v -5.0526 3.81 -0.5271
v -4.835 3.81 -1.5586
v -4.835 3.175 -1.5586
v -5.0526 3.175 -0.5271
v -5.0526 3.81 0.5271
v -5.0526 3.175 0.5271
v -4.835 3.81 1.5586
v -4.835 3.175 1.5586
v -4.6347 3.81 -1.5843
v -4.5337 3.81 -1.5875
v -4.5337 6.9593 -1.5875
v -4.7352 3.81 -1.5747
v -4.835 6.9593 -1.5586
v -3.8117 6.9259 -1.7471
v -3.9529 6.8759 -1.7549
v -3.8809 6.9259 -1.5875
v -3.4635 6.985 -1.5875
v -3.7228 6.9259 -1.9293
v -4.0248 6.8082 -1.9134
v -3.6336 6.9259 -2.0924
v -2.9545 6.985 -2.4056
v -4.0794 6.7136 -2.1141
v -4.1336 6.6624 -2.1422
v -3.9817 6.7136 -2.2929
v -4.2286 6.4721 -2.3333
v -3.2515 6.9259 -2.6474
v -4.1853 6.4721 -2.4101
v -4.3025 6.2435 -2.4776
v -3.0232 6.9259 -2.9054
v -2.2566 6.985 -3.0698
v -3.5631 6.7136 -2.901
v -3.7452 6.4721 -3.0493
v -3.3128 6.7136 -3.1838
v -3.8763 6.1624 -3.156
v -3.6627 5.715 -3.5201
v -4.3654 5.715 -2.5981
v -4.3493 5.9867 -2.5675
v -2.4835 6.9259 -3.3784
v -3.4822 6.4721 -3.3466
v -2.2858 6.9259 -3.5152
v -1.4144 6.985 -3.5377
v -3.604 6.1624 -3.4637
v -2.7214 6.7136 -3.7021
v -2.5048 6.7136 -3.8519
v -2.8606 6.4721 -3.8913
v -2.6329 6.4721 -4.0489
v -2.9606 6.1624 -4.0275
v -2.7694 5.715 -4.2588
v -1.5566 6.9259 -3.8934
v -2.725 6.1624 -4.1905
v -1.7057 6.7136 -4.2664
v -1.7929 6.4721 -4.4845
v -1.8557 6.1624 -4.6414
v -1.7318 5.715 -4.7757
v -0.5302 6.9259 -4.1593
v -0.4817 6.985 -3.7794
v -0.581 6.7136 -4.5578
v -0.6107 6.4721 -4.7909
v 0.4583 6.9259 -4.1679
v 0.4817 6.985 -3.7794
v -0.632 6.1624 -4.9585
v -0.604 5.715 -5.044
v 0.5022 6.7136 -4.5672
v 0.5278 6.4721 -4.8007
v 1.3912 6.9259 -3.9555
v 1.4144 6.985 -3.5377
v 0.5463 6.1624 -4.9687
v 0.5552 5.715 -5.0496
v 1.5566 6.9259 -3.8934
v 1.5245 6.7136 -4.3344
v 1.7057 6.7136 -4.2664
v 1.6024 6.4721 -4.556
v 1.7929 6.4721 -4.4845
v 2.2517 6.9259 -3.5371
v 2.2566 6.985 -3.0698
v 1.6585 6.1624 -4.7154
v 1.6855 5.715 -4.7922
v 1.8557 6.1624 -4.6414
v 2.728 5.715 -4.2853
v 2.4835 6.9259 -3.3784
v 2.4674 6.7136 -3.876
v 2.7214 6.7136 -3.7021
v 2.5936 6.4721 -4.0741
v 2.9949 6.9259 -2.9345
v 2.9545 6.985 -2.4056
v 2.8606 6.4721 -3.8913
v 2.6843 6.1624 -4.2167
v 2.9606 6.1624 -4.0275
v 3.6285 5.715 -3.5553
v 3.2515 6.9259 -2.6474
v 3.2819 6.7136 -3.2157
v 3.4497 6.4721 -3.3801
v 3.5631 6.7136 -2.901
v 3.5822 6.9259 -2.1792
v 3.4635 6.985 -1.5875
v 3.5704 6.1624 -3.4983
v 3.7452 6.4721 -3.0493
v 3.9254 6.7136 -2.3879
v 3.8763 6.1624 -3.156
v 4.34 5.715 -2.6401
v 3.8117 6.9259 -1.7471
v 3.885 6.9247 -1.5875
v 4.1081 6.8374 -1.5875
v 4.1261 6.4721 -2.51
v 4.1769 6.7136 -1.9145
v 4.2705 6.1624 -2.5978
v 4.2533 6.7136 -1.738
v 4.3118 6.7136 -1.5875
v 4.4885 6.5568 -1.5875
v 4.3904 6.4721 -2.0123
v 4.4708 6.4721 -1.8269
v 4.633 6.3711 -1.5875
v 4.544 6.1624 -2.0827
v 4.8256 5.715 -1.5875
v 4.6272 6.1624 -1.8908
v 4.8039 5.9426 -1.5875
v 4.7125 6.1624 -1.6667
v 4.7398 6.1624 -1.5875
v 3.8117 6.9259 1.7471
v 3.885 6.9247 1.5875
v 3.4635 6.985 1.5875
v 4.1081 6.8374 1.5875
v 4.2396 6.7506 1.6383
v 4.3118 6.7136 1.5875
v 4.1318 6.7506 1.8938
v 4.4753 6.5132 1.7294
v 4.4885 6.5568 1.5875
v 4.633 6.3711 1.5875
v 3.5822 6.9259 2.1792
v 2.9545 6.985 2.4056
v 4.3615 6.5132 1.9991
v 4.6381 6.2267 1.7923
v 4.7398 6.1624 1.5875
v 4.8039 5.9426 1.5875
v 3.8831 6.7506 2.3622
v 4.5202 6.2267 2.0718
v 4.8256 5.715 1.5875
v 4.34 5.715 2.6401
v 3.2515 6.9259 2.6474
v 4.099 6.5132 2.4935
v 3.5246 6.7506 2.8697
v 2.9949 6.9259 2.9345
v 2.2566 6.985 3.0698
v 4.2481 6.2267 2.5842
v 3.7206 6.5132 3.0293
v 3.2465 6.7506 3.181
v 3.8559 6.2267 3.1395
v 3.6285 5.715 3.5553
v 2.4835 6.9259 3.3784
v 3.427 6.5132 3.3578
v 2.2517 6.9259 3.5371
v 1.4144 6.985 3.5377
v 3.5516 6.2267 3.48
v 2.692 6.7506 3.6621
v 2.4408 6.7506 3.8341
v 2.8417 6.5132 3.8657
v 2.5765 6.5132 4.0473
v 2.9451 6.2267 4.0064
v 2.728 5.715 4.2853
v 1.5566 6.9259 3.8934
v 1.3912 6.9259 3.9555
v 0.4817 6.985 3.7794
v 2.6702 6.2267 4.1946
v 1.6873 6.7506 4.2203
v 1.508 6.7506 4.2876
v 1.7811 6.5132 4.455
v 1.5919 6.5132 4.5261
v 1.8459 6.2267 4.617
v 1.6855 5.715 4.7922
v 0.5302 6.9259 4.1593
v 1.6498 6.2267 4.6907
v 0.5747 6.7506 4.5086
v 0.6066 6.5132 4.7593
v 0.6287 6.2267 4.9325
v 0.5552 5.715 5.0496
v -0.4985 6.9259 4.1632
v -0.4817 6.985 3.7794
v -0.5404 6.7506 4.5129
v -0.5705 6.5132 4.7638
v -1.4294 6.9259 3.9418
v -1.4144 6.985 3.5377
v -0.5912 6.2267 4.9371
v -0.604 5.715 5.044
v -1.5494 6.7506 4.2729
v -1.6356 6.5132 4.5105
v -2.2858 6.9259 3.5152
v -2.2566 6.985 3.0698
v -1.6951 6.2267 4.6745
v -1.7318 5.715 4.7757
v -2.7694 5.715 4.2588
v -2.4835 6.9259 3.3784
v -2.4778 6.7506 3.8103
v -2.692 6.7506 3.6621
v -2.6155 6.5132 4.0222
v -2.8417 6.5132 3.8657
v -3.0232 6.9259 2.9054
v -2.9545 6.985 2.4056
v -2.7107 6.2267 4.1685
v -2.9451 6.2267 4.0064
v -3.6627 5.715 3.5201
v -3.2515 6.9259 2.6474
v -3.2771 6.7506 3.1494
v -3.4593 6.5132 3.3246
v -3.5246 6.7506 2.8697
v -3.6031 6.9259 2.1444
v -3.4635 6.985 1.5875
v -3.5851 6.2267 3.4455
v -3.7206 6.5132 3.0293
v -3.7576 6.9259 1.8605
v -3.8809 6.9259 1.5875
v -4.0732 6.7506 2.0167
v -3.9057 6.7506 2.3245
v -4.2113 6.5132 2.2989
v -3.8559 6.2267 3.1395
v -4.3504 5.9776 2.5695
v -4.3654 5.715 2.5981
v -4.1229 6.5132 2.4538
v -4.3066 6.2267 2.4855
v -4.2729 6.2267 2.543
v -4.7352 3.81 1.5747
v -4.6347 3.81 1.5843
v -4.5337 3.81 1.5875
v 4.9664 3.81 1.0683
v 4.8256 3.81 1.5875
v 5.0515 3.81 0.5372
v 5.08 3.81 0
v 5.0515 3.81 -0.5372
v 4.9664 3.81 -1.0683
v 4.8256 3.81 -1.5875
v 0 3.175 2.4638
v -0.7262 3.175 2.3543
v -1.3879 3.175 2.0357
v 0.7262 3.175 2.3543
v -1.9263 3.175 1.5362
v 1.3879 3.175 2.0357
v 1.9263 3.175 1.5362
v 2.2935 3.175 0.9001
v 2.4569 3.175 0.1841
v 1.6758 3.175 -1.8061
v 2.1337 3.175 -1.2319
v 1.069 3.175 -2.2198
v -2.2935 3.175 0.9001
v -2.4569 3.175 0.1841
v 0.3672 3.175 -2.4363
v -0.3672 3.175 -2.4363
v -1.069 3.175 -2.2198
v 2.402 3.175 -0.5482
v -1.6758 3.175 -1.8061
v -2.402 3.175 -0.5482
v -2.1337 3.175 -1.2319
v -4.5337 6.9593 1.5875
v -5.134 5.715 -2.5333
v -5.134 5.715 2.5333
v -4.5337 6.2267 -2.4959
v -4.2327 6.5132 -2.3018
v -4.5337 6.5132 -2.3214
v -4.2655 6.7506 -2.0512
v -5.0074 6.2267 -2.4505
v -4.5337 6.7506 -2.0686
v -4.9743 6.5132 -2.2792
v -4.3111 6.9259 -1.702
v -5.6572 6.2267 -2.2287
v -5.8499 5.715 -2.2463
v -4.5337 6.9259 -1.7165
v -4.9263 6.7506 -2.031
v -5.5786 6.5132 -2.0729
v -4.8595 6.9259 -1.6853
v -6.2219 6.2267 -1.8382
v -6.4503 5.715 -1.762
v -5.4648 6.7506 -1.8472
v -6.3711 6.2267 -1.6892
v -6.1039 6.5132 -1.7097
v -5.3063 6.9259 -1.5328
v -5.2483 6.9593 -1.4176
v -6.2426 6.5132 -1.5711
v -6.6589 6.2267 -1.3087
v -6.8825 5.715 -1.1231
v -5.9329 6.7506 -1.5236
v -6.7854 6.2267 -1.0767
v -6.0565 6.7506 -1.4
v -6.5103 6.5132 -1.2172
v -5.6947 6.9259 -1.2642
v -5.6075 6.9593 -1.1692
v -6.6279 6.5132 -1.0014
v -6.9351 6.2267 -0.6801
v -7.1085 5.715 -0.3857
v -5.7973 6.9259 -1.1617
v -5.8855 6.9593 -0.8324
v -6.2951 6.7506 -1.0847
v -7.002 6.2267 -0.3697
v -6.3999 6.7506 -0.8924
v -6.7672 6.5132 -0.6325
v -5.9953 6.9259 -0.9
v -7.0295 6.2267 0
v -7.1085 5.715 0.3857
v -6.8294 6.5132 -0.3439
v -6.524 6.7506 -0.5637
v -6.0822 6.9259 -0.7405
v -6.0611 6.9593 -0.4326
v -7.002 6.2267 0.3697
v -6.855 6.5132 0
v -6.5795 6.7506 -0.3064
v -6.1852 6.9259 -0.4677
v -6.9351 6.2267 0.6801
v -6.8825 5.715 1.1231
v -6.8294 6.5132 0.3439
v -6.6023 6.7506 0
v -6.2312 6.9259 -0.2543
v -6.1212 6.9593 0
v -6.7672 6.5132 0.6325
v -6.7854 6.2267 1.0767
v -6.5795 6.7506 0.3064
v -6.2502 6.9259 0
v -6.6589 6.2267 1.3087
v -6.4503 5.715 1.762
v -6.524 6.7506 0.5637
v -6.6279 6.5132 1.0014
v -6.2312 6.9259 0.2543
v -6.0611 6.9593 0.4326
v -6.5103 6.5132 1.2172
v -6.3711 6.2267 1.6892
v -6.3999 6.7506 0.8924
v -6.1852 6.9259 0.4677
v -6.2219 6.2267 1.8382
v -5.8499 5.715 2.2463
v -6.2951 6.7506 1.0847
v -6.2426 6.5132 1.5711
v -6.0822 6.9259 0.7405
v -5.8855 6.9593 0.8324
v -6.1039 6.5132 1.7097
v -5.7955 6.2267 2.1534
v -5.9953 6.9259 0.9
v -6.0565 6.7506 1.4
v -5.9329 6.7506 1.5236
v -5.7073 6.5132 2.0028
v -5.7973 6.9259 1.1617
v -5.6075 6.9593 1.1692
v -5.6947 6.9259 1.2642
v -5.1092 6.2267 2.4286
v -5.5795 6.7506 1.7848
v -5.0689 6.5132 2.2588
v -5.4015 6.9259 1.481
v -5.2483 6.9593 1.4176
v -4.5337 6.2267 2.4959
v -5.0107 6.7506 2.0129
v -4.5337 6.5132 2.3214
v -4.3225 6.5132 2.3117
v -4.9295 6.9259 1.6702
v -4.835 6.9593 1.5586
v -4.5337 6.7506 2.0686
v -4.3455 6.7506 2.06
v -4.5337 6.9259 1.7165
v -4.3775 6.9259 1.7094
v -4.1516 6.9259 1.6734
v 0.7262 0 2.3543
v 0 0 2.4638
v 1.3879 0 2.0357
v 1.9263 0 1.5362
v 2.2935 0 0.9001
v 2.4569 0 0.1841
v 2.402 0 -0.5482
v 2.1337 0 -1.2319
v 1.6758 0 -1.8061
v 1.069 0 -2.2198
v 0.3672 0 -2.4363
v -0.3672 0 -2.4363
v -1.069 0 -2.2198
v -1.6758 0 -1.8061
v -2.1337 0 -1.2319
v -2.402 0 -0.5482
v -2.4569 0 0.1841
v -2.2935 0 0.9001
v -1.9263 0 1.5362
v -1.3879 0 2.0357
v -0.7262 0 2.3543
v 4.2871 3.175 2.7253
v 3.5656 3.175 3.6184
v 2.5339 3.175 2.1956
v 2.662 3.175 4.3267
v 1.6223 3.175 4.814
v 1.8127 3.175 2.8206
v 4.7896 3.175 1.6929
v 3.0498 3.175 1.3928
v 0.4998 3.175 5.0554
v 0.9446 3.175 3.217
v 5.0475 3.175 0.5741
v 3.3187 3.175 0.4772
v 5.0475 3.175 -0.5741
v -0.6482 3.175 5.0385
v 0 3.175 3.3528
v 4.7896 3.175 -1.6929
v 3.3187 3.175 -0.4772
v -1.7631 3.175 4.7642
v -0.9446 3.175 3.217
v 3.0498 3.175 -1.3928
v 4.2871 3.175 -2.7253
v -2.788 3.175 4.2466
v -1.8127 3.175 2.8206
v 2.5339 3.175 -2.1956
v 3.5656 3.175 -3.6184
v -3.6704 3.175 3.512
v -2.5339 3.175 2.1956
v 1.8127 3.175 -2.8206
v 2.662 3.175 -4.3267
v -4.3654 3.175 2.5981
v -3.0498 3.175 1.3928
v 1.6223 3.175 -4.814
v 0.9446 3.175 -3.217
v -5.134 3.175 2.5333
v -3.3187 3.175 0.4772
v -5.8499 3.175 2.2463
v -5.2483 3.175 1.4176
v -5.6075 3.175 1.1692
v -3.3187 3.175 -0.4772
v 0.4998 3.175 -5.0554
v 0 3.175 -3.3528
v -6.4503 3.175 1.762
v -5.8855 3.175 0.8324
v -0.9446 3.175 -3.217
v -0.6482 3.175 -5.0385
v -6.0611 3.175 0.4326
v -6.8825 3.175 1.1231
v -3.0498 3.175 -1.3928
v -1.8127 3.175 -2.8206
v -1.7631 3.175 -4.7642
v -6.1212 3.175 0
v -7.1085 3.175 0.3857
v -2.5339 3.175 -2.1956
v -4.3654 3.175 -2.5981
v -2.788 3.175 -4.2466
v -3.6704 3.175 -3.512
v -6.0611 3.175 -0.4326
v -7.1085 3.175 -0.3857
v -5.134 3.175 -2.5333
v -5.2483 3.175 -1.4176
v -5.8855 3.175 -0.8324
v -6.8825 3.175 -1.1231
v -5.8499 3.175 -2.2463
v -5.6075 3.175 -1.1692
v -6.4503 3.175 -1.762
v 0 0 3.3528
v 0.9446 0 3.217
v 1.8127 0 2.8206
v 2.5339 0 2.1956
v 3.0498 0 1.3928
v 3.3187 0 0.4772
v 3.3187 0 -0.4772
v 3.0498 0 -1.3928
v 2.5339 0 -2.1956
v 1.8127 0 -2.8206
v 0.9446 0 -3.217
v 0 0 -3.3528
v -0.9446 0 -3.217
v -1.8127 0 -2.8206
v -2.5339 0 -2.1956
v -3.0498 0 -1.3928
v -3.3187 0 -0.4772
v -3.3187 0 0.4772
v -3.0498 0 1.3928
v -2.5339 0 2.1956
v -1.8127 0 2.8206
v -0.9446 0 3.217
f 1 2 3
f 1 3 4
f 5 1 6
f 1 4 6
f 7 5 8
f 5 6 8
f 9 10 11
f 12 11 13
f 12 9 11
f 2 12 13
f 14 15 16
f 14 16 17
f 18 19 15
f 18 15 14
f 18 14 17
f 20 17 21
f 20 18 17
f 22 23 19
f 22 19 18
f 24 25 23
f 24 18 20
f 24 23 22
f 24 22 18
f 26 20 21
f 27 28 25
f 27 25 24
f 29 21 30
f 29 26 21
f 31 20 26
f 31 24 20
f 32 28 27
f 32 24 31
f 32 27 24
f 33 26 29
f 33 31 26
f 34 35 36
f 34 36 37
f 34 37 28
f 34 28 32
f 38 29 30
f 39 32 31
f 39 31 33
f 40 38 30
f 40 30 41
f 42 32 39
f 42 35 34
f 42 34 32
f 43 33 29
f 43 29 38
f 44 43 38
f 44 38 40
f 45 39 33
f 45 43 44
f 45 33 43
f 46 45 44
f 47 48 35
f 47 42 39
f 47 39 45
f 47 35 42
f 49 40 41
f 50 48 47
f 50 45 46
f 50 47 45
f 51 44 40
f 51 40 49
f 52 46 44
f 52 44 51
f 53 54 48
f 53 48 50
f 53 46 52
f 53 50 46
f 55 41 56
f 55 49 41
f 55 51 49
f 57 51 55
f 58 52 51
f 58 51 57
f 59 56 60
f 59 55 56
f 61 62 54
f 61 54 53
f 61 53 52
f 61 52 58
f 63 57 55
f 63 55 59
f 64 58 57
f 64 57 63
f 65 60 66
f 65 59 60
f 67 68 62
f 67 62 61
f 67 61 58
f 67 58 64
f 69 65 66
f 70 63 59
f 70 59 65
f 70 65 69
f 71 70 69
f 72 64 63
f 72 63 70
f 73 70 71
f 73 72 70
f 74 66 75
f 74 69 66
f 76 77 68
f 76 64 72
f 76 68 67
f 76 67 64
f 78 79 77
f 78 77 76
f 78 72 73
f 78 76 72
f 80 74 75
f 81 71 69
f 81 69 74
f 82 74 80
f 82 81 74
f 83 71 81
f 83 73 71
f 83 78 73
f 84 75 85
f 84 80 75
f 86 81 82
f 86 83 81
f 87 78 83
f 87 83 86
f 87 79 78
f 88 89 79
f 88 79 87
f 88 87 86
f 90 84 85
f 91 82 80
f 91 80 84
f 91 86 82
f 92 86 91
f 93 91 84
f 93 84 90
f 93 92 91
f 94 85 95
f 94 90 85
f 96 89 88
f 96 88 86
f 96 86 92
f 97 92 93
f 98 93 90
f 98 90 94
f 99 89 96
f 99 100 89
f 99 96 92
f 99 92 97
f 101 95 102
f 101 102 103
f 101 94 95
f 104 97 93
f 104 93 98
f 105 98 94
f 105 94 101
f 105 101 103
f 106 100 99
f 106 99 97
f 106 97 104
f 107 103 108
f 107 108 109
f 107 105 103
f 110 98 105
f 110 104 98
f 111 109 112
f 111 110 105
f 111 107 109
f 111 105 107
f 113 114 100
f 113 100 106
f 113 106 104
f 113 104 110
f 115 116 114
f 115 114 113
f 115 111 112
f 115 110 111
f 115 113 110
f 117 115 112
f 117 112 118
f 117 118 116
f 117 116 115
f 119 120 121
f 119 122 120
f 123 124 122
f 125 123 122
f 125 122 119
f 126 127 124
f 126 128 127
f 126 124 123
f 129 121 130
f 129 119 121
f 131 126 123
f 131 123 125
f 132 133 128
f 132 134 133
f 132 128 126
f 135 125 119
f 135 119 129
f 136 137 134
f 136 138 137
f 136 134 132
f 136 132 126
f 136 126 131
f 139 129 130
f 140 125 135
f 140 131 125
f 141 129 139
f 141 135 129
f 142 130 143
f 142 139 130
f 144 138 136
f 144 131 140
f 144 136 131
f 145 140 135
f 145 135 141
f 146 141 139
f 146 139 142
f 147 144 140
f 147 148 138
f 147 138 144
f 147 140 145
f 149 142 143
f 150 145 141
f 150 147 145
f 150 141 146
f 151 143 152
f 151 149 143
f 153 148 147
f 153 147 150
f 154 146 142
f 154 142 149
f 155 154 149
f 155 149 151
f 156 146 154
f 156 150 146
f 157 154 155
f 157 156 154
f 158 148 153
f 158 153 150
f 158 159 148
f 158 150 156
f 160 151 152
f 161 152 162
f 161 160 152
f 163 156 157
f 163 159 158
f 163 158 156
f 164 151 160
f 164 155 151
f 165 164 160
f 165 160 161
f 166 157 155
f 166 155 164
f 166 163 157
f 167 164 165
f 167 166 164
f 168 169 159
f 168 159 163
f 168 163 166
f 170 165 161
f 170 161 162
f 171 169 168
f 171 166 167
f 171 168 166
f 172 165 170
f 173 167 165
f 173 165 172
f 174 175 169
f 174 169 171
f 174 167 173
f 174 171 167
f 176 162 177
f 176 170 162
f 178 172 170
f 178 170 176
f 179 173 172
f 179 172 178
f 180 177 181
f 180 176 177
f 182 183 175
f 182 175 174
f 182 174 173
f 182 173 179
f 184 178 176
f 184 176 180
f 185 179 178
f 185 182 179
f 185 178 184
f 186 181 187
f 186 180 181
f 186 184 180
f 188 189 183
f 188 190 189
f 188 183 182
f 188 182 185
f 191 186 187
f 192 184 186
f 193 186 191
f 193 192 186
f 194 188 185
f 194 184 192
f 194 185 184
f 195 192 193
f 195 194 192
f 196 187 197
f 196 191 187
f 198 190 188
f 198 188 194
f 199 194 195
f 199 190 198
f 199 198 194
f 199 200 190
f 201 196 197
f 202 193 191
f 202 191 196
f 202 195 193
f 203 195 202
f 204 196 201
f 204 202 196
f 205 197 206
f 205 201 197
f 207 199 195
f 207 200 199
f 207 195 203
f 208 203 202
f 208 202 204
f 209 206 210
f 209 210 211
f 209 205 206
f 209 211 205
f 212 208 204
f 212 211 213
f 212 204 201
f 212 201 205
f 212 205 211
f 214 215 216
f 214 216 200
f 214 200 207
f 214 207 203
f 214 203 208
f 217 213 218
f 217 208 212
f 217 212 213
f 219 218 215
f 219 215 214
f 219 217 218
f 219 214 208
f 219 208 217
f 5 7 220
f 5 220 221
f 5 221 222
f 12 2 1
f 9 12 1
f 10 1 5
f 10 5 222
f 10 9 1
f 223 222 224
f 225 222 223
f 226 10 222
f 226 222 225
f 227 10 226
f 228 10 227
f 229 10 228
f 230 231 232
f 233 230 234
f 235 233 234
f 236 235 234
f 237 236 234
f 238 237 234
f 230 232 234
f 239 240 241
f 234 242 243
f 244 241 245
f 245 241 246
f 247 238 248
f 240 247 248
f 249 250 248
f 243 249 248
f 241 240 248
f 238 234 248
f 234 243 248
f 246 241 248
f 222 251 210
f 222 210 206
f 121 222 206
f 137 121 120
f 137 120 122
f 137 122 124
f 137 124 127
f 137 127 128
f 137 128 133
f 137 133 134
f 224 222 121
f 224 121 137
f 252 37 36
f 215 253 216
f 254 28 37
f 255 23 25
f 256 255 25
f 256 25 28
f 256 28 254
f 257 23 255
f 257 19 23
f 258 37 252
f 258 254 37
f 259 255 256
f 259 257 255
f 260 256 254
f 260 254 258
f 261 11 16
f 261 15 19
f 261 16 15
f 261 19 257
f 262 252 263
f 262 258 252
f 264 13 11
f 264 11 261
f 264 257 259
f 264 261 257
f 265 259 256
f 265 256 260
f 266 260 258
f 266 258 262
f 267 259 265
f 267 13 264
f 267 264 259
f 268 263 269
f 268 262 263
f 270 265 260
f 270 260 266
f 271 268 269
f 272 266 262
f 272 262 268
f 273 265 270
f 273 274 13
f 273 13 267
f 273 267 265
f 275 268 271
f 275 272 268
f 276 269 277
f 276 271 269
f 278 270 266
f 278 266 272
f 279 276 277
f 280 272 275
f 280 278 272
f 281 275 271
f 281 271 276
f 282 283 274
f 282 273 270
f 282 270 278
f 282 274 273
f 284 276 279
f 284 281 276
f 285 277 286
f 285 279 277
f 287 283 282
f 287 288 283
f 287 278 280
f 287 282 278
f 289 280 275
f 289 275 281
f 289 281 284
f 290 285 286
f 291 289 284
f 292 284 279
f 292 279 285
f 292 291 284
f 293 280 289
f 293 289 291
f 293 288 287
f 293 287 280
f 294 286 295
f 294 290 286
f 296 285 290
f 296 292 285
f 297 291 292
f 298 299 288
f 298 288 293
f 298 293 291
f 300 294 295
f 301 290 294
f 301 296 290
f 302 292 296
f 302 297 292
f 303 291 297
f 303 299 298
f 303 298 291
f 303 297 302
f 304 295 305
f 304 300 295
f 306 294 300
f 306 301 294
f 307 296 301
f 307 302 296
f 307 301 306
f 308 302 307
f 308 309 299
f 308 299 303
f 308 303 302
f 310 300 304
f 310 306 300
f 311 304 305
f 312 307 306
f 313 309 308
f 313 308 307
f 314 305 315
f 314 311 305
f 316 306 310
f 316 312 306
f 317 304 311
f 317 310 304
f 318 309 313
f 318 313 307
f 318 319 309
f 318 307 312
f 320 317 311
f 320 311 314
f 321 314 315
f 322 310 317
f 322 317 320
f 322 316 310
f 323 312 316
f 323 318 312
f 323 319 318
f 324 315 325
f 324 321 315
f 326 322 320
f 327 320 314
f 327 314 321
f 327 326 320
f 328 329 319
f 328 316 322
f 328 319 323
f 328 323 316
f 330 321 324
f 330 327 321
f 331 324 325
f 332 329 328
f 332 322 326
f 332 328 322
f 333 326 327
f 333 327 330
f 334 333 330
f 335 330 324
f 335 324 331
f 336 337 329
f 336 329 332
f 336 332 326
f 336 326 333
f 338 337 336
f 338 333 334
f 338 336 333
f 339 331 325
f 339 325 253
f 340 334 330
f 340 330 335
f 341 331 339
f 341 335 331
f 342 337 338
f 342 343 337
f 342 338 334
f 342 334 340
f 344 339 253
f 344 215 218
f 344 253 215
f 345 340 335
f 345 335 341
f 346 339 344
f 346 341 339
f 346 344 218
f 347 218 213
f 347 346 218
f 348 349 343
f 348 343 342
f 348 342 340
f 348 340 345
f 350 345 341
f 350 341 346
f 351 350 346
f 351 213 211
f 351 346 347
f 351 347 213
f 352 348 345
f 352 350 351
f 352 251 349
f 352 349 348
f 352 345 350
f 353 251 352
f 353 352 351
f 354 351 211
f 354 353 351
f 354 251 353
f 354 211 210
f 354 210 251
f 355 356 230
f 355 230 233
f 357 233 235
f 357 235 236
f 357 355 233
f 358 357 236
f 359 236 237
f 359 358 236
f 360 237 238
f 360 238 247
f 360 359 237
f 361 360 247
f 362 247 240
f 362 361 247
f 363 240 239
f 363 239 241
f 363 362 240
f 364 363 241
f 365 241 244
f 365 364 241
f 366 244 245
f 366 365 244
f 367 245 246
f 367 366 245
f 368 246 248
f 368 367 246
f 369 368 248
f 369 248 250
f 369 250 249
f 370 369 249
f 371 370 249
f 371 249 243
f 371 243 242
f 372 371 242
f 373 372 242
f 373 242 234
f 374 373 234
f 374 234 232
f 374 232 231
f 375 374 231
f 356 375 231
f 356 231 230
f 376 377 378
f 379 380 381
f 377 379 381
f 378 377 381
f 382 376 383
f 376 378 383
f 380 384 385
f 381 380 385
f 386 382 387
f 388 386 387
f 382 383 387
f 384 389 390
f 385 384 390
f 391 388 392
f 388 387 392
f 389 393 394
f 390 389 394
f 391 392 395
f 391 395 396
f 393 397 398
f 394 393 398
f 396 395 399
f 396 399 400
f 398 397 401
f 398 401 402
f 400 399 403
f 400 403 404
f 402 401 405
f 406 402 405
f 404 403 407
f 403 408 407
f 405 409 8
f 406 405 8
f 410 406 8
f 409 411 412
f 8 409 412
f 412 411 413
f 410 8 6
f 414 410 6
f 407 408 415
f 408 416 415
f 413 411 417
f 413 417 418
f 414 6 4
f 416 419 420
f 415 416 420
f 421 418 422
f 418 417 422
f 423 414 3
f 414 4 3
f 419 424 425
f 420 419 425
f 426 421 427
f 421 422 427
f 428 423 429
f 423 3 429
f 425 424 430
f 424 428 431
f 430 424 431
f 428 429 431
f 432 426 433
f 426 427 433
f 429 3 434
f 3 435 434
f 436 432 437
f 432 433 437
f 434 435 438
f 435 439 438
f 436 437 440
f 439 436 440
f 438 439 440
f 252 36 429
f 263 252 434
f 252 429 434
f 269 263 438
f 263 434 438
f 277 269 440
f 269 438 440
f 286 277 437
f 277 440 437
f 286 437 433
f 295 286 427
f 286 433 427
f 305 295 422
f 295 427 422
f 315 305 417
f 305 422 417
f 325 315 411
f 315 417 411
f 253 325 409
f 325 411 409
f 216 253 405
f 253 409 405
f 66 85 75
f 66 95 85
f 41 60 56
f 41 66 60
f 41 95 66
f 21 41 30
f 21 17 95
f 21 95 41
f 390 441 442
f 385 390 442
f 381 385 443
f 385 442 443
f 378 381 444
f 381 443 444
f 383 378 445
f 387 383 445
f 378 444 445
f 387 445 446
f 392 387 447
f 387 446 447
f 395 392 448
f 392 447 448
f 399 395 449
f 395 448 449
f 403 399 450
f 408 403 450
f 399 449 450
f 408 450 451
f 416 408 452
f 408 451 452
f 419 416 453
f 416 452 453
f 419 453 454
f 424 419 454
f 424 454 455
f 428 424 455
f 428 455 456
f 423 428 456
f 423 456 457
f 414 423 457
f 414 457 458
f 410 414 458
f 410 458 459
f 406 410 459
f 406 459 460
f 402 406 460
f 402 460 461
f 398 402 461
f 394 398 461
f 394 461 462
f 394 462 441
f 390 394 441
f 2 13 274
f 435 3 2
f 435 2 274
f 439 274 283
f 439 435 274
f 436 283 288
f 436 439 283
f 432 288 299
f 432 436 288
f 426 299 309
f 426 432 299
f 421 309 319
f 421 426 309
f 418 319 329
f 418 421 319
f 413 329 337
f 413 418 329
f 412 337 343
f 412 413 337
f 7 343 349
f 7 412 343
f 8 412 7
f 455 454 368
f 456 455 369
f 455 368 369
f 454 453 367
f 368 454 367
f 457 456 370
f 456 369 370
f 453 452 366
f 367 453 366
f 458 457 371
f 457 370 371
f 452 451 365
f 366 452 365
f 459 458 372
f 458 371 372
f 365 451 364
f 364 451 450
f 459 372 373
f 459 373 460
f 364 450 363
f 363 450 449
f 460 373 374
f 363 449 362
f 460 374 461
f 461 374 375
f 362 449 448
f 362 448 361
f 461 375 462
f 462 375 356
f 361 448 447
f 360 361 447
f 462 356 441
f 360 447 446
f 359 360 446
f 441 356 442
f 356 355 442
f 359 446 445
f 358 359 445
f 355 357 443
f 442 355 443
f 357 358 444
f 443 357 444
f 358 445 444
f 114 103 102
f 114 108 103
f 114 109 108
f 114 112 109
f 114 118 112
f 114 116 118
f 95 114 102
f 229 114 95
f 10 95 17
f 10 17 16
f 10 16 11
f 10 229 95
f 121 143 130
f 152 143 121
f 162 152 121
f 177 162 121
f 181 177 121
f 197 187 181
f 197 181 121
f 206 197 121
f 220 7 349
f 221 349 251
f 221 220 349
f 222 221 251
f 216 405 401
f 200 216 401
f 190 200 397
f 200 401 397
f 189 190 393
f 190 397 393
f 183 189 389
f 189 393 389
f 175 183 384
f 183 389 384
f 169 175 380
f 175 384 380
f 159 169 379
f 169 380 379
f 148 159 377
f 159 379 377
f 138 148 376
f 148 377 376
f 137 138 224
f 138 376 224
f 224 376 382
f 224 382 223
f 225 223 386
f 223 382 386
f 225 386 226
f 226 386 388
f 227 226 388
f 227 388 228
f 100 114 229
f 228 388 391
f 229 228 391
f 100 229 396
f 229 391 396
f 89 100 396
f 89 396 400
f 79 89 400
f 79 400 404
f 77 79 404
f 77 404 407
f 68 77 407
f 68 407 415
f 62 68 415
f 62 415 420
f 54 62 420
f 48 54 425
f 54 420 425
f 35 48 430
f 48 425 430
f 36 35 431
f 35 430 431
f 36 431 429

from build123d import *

# Parameters (mm, degrees)
SKETCH1_R           = 3.3528
SKETCH1_R_2         = 2.4638
BOSS_EXTRUDE1_DEPTH = 3.175
SKETCH2_R           = 5.08
BOSS_EXTRUDE2_DEPTH = 3.81
BOSS_EXTRUDE3_START = -3.81
SKETCH3_R           = 5.08
SKETCH3_R_2         = 2.6035
SKETCH3_R_3         = 1.5875
BOSS_EXTRUDE3_DEPTH = 3.81
CUT_EXTRUDE1_START  = -3.175
CUT_EXTRUDE1_DEPTH  = 3.175
FILLET1_R           = 1.27


with BuildPart() as part:
    # Sketch1 → Boss-Extrude1 (new body)
    with BuildSketch(Plane(origin=(0, 0, 0), x_dir=(1, 0, 0), z_dir=(0, 1, 0))):
        with Locations(Location((0, 0, 0), (0, 0, 270))):
            Circle(SKETCH1_R)
        with Locations(Location((0, 0, 0), (0, 0, 270))):
            Circle(SKETCH1_R_2, mode=Mode.SUBTRACT)
    extrude(amount=BOSS_EXTRUDE1_DEPTH)

    # Sketch2 → Boss-Extrude2 (add)
    with BuildSketch(Plane(origin=(0, 3.175, 0), x_dir=(1, 0, 0), z_dir=(0, 1, 0))):
        with Locations(Location((0, 0, 0), (0, 0, 90))):
            Circle(SKETCH2_R)
    extrude(amount=BOSS_EXTRUDE2_DEPTH)

    # Sketch3 → Boss-Extrude3 (add)
    # profile 1 of 3: a face of its own
    with BuildSketch(Plane(origin=(0, 6.985, 0), x_dir=(1, 0, 0), z_dir=(0, 1, 0)).offset(BOSS_EXTRUDE3_START)):
        Circle(SKETCH3_R)
    # profile 2 of 3: a face of its own
    with BuildSketch(Plane(origin=(0, 6.985, 0), x_dir=(1, 0, 0), z_dir=(0, 1, 0)).offset(BOSS_EXTRUDE3_START)):
        with Locations((-4.533681302, 0)):
            Circle(SKETCH3_R_2)
        with Locations((-4.533681302, 0)):
            Circle(SKETCH3_R_3, mode=Mode.SUBTRACT)
    # profile 3 of 3: a face of its own
    with BuildSketch(Plane(origin=(0, 6.985, 0), x_dir=(1, 0, 0), z_dir=(0, 1, 0)).offset(BOSS_EXTRUDE3_START)):
        Circle(SKETCH3_R)
    extrude(amount=BOSS_EXTRUDE3_DEPTH)

    # Sketch4 → Cut-Extrude1 (cut)
    with BuildSketch(Plane(origin=(0, 6.985, 0), x_dir=(1, 0, 0), z_dir=(0, 1, 0)).offset(CUT_EXTRUDE1_START)):
        with BuildLine():
            ThreePointArc((-4.834979234, -1.558645504), (-4.685019521, -1.580269912), (-4.533681302, -1.5875))
            Line((-4.533681302, -1.5875), (4.825582219, -1.5875))
            ThreePointArc((4.825582219, -1.5875), (5.015992308, -0.803878824), (5.08, 0))
            ThreePointArc((5.08, 0), (5.015992308, 0.803878824), (4.825582219, 1.5875))
            Line((4.825582219, 1.5875), (-4.533681302, 1.5875))
            ThreePointArc((-4.533681302, 1.5875), (-4.685019521, 1.580269912), (-4.834979234, 1.558645504))
            ThreePointArc((-4.834979234, 1.558645504), (-5.08, 0), (-4.834979234, -1.558645504))
        make_face()
    extrude(amount=CUT_EXTRUDE1_DEPTH, mode=Mode.SUBTRACT)

    # Fillet1
    # the kernel refuses this fillet: 1.27 mm, written as the material it takes off along each edge
    with BuildSketch(Plane(origin=(-4.533681302, 6.985, 0), x_dir=(0.9598113025197432, 0, -0.2806461536443247), z_dir=(0.2806461536443247, 0, 0.9598113025197432))) as fillet1_piece_1_section:
        with BuildLine():
            CenterArc((2.6035 - FILLET1_R, -FILLET1_R), FILLET1_R, 0, 90)
            Line((2.6035, -FILLET1_R), (2.6035, 0))
            Line((2.6035, 0), (2.6035 - FILLET1_R, 0))
        make_face()
    fillet1_piece_1 = revolve(axis=Axis((-4.533681302, 6.985, 0), (0, 1, 0)), revolution_arc=327.402454095, mode=Mode.PRIVATE)
    fillet1_piece_1 = split(fillet1_piece_1, bisect_by=Plane(origin=(-4.533681302, 6.985, 1.5875), z_dir=(0, 0, -1)), keep=Keep.TOP, mode=Mode.PRIVATE)
    fillet1_piece_1 = split(fillet1_piece_1, bisect_by=Plane(origin=(-4.533681302, 6.985, -1.5875), z_dir=(0, 0, 1)), keep=Keep.TOP, mode=Mode.PRIVATE)
    add(fillet1_piece_1, mode=Mode.SUBTRACT)
    with BuildSketch(Plane(origin=(-4.533681302, 6.985, 0), x_dir=(0.9598113025197432, 0, -0.2806461536443247), z_dir=(0.2806461536443247, 0, 0.9598113025197432))) as fillet1_piece_2_section:
        with BuildLine():
            CenterArc((2.6035 - FILLET1_R, -FILLET1_R), FILLET1_R, 0, 90)
            Line((2.6035, -FILLET1_R), (2.6035, 0))
            Line((2.6035, 0), (2.6035 - FILLET1_R, 0))
        make_face()
    fillet1_piece_2 = revolve(axis=Axis((-4.533681302, 6.985, 0), (0, 1, 0)), revolution_arc=327.402454095, mode=Mode.PRIVATE)
    fillet1_piece_2 = fillet1_piece_2 - Plane(origin=(0, 6.985, 0), x_dir=(0, 0, -1), z_dir=(0, -1, 0)) * Cylinder(5.08, 11, mode=Mode.PRIVATE)
    add(fillet1_piece_2, mode=Mode.SUBTRACT)
    with BuildSketch(Plane(origin=(0, 6.985, 0), x_dir=(-0.9960699199988063, 0, 0.08857039275949603), z_dir=(0.08857039275949603, 0, 0.9960699199988063))) as fillet1_piece_3_section:
        with BuildLine():
            CenterArc((5.08 - FILLET1_R, FILLET1_R), FILLET1_R, 270, 90)
            Line((5.08 - FILLET1_R, 0), (5.08, 0))
            Line((5.08, 0), (5.08, FILLET1_R))
        make_face()
    fillet1_piece_3 = revolve(axis=Axis((0, 6.985, 0), (0, -1, 0)), revolution_arc=202.711774456, mode=Mode.PRIVATE)
    fillet1_piece_3 = fillet1_piece_3 - Plane(origin=(-4.533681302, 6.985, 0), x_dir=(1, 0, 0), z_dir=(0, -1, 0)) * Cylinder(2.6035, 21, mode=Mode.PRIVATE)
    add(fillet1_piece_3, mode=Mode.SUBTRACT)
    with BuildSketch(Plane(origin=(0, 6.985, 0), x_dir=(0.9530300689504536, 0, -0.30287569674091297), z_dir=(-0.30287569674091297, 0, -0.9530300689504536))) as fillet1_piece_4_section:
        with BuildLine():
            CenterArc((5.08 - FILLET1_R, FILLET1_R), FILLET1_R, 270, 90)
            Line((5.08 - FILLET1_R, 0), (5.08, 0))
            Line((5.08, 0), (5.08, FILLET1_R))
        make_face()
    fillet1_piece_4 = revolve(axis=Axis((0, 6.985, 0), (0, -1, 0)), revolution_arc=202.711774456, mode=Mode.PRIVATE)
    fillet1_piece_4 = fillet1_piece_4 - Plane(origin=(-4.533681302, 6.985, 0), x_dir=(1, 0, 0), z_dir=(0, -1, 0)) * Cylinder(2.6035, 21, mode=Mode.PRIVATE)
    add(fillet1_piece_4, mode=Mode.SUBTRACT)
    with BuildSketch(Plane(origin=(0, 6.985, 0), x_dir=(-0.9960699199988063, 0, 0.08857039275949603), z_dir=(0.08857039275949603, 0, 0.9960699199988063))) as fillet1_piece_5a_section:
        with BuildLine():
            CenterArc((5.08 - FILLET1_R, FILLET1_R), FILLET1_R, 270, 90)
            Line((5.08 - FILLET1_R, 0), (5.08, 0))
            Line((5.08, 0), (5.08, FILLET1_R))
        make_face()
    fillet1_piece_5a = revolve(axis=Axis((0, 6.985, 0), (0, -1, 0)), revolution_arc=202.711774456, mode=Mode.PRIVATE)
    fillet1_piece_5a = split(fillet1_piece_5a, bisect_by=Plane(origin=(0, 6.985, -1.5875), z_dir=(0, 0, -1)), keep=Keep.TOP, mode=Mode.PRIVATE)
    fillet1_piece_5a = fillet1_piece_5a & Plane(origin=(-4.533681302, 6.985, 0), x_dir=(1, 0, 0), z_dir=(0, -1, 0)) * Cylinder(2.6035, 21, mode=Mode.PRIVATE)
    with BuildSketch(Plane(origin=(-4.533681302, 6.985, 0), x_dir=(0.9598113025197432, 0, -0.2806461536443247), z_dir=(0.2806461536443247, 0, 0.9598113025197432))) as fillet1_piece_5b_section:
        with BuildLine():
            CenterArc((2.6035 - FILLET1_R, -FILLET1_R), FILLET1_R, 0, 90)
            Line((2.6035, -FILLET1_R), (2.6035, 0))
            Line((2.6035, 0), (2.6035 - FILLET1_R, 0))
        make_face()
    fillet1_piece_5b = revolve(axis=Axis((-4.533681302, 6.985, 0), (0, 1, 0)), revolution_arc=327.402454095, mode=Mode.PRIVATE)
    fillet1_piece_5b = fillet1_piece_5b & Plane(origin=(0, 6.985, 0), x_dir=(0, 0, -1), z_dir=(0, -1, 0)) * Cylinder(5.08, 11, mode=Mode.PRIVATE)
    fillet1_piece_5b = split(fillet1_piece_5b, bisect_by=Plane(origin=(-4.533681302, 6.985, -1.5875), z_dir=(0, 0, -1)), keep=Keep.TOP, mode=Mode.PRIVATE)
    fillet1_piece_5 = fillet1_piece_5a & fillet1_piece_5b
    add(fillet1_piece_5, mode=Mode.SUBTRACT)
    with BuildSketch(Plane(origin=(0, 6.985, 0), x_dir=(0.9530300689504536, 0, -0.30287569674091297), z_dir=(-0.30287569674091297, 0, -0.9530300689504536))) as fillet1_piece_6a_section:
        with BuildLine():
            CenterArc((5.08 - FILLET1_R, FILLET1_R), FILLET1_R, 270, 90)
            Line((5.08 - FILLET1_R, 0), (5.08, 0))
            Line((5.08, 0), (5.08, FILLET1_R))
        make_face()
    fillet1_piece_6a = revolve(axis=Axis((0, 6.985, 0), (0, -1, 0)), revolution_arc=202.711774456, mode=Mode.PRIVATE)
    fillet1_piece_6a = split(fillet1_piece_6a, bisect_by=Plane(origin=(0, 6.985, 1.5875), z_dir=(0, 0, 1)), keep=Keep.TOP, mode=Mode.PRIVATE)
    fillet1_piece_6a = fillet1_piece_6a & Plane(origin=(-4.533681302, 6.985, 0), x_dir=(1, 0, 0), z_dir=(0, -1, 0)) * Cylinder(2.6035, 21, mode=Mode.PRIVATE)
    with BuildSketch(Plane(origin=(-4.533681302, 6.985, 0), x_dir=(0.9598113025197432, 0, -0.2806461536443247), z_dir=(0.2806461536443247, 0, 0.9598113025197432))) as fillet1_piece_6b_section:
        with BuildLine():
            CenterArc((2.6035 - FILLET1_R, -FILLET1_R), FILLET1_R, 0, 90)
            Line((2.6035, -FILLET1_R), (2.6035, 0))
            Line((2.6035, 0), (2.6035 - FILLET1_R, 0))
        make_face()
    fillet1_piece_6b = revolve(axis=Axis((-4.533681302, 6.985, 0), (0, 1, 0)), revolution_arc=327.402454095, mode=Mode.PRIVATE)
    fillet1_piece_6b = fillet1_piece_6b & Plane(origin=(0, 6.985, 0), x_dir=(0, 0, -1), z_dir=(0, -1, 0)) * Cylinder(5.08, 11, mode=Mode.PRIVATE)
    fillet1_piece_6b = split(fillet1_piece_6b, bisect_by=Plane(origin=(-4.533681302, 6.985, 1.5875), z_dir=(0, 0, 1)), keep=Keep.TOP, mode=Mode.PRIVATE)
    fillet1_piece_6 = fillet1_piece_6a & fillet1_piece_6b
    add(fillet1_piece_6, mode=Mode.SUBTRACT)


solid = part.part
